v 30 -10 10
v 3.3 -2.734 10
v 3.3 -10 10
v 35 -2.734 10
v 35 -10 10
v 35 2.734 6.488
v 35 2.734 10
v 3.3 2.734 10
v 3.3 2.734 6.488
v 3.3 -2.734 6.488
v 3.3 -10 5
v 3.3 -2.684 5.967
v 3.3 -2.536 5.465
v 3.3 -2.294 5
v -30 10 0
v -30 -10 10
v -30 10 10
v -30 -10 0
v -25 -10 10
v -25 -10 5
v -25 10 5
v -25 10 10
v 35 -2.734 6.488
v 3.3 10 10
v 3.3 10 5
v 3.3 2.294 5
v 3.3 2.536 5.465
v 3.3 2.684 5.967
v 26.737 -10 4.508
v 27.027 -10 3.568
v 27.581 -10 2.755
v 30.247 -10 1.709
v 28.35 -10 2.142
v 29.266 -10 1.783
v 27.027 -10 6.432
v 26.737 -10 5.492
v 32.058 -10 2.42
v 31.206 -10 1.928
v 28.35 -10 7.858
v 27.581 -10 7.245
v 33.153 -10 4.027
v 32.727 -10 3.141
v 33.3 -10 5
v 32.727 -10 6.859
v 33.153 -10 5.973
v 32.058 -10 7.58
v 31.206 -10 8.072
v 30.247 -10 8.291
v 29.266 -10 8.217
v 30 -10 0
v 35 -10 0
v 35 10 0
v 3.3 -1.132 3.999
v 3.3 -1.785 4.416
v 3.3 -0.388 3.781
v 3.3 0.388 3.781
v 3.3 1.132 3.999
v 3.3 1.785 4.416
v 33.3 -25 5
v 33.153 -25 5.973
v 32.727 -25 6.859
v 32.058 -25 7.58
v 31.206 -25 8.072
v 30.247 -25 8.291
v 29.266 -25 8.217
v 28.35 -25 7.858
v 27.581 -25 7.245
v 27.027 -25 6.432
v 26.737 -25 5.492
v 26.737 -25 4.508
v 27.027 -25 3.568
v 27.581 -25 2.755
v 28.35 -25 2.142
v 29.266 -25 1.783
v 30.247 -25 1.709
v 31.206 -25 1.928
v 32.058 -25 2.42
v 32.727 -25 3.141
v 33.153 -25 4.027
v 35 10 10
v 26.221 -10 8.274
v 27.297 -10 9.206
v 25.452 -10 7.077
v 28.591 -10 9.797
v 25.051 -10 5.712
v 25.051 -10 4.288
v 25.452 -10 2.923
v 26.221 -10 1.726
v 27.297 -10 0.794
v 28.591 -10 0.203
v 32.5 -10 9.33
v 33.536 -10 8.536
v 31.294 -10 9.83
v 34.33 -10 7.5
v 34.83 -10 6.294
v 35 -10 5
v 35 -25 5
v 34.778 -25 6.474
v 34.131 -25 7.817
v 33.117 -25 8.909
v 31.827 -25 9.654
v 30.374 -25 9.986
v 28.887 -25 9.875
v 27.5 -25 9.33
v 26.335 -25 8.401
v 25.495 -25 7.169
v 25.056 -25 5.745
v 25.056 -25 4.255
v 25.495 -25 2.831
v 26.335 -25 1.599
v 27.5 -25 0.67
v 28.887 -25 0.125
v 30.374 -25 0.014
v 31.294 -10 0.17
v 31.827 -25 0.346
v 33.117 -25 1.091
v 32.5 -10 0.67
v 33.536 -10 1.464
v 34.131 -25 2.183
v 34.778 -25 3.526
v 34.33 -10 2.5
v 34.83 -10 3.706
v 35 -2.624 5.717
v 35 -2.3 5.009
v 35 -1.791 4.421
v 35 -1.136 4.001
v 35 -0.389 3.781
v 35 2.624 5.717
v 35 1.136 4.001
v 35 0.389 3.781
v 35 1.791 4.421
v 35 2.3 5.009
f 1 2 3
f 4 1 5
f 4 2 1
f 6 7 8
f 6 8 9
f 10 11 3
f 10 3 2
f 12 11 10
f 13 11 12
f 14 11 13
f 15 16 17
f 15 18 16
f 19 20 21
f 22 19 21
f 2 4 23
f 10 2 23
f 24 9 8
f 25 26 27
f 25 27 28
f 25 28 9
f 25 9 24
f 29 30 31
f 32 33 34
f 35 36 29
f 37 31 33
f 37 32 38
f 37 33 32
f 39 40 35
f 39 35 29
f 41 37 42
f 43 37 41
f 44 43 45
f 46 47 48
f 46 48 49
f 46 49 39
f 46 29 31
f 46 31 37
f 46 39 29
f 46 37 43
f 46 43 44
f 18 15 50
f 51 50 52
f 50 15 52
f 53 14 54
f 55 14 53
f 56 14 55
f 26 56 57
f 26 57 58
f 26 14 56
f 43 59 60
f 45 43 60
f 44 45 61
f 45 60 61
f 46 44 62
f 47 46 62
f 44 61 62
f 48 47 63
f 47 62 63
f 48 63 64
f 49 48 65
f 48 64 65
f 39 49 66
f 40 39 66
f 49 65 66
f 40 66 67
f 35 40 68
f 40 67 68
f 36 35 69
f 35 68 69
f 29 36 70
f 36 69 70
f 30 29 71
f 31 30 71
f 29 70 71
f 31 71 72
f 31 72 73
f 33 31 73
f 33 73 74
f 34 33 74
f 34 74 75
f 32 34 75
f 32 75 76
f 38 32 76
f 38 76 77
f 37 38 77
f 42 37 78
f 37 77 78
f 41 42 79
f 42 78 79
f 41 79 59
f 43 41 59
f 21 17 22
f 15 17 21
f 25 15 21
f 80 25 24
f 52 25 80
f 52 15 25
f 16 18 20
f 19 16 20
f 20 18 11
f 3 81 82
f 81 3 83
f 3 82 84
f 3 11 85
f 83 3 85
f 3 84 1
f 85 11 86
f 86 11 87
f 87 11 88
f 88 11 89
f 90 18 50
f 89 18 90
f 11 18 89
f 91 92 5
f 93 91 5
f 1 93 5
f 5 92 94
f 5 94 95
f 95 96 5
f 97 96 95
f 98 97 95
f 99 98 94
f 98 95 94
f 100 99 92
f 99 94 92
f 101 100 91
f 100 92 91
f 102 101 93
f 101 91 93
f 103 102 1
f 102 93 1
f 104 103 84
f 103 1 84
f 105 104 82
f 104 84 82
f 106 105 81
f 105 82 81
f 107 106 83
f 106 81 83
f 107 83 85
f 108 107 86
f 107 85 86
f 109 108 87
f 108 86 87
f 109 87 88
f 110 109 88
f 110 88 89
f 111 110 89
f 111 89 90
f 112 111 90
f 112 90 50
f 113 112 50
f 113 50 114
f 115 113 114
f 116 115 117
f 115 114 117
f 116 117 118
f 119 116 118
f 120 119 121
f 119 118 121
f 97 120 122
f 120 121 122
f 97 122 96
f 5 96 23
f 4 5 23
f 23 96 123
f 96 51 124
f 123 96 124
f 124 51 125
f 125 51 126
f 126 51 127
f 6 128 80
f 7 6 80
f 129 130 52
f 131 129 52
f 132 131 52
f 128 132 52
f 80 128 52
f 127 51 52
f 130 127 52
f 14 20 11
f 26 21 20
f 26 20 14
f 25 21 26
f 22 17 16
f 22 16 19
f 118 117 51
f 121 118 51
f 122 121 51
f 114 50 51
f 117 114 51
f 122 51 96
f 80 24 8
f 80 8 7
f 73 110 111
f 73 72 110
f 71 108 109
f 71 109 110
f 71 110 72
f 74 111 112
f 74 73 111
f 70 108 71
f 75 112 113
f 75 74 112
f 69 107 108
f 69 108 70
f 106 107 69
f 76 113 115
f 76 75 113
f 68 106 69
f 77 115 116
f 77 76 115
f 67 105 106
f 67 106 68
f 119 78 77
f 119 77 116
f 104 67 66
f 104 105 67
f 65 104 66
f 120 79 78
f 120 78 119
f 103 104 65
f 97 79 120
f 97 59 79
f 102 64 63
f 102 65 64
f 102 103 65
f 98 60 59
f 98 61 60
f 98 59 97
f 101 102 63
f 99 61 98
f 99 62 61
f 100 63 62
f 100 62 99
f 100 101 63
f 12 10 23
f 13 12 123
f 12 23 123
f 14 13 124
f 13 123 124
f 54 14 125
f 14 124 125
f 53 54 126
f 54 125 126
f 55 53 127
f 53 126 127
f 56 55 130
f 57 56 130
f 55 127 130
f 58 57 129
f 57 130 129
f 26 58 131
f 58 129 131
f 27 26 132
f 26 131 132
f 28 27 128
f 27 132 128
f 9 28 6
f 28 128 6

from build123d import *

# Parameters (mm, degrees)
SKETCH_W        = 65
SKETCH_H        = 20
PAD_DEPTH       = 5
SKETCH001_W     = 5
SKETCH001_H     = 20
SKETCH001_W_2   = 31.7
PAD001_DEPTH    = 5
POCKET_DEPTH    = 31.7
SKETCH003_R     = 5
PAD002_DEPTH    = 15
SKETCH004_R     = 3.3
POCKET001_DEPTH = 15


with BuildPart() as part:
    # Sketch → Pad (new body)
    with BuildSketch(Plane.XY):
        with Locations((2.5, 0)):
            Rectangle(SKETCH_W, SKETCH_H)
    extrude(amount=PAD_DEPTH)

    # Sketch001 → Pad001 (new body)
    with BuildSketch(Plane.XY.offset(5)):
        with Locations((-27.5, 0)):
            Rectangle(SKETCH001_W, SKETCH001_H)
        with Locations((19.15, 0)):
            Rectangle(SKETCH001_W_2, SKETCH001_H)
    extrude(amount=PAD001_DEPTH)

    # Sketch002 → Pocket (cut)
    with BuildSketch(Plane.YZ.offset(35)):
        with BuildLine():
            Line((-2.73443, 10), (-2.73443, 6.487833))
            ThreePointArc((-2.73443, 6.487833), (0, 3.753403), (2.73443, 6.487833))
            Line((2.73443, 10), (2.73443, 6.487833))
            Line((-2.73443, 10), (2.73443, 10))
        make_face()
    extrude(amount=-POCKET_DEPTH, mode=Mode.SUBTRACT)

    # Sketch003 → Pad002 (new body)
    with BuildSketch(Plane.XZ.offset(10)):
        with Locations((30, 5)):
            Circle(SKETCH003_R)
    extrude(amount=PAD002_DEPTH)

    # Sketch004 → Pocket001 (cut)
    with BuildSketch(Plane.XZ.offset(25)):
        with Locations((30, 5)):
            Circle(SKETCH004_R)
    extrude(amount=-POCKET001_DEPTH, mode=Mode.SUBTRACT)


solid = part.part
